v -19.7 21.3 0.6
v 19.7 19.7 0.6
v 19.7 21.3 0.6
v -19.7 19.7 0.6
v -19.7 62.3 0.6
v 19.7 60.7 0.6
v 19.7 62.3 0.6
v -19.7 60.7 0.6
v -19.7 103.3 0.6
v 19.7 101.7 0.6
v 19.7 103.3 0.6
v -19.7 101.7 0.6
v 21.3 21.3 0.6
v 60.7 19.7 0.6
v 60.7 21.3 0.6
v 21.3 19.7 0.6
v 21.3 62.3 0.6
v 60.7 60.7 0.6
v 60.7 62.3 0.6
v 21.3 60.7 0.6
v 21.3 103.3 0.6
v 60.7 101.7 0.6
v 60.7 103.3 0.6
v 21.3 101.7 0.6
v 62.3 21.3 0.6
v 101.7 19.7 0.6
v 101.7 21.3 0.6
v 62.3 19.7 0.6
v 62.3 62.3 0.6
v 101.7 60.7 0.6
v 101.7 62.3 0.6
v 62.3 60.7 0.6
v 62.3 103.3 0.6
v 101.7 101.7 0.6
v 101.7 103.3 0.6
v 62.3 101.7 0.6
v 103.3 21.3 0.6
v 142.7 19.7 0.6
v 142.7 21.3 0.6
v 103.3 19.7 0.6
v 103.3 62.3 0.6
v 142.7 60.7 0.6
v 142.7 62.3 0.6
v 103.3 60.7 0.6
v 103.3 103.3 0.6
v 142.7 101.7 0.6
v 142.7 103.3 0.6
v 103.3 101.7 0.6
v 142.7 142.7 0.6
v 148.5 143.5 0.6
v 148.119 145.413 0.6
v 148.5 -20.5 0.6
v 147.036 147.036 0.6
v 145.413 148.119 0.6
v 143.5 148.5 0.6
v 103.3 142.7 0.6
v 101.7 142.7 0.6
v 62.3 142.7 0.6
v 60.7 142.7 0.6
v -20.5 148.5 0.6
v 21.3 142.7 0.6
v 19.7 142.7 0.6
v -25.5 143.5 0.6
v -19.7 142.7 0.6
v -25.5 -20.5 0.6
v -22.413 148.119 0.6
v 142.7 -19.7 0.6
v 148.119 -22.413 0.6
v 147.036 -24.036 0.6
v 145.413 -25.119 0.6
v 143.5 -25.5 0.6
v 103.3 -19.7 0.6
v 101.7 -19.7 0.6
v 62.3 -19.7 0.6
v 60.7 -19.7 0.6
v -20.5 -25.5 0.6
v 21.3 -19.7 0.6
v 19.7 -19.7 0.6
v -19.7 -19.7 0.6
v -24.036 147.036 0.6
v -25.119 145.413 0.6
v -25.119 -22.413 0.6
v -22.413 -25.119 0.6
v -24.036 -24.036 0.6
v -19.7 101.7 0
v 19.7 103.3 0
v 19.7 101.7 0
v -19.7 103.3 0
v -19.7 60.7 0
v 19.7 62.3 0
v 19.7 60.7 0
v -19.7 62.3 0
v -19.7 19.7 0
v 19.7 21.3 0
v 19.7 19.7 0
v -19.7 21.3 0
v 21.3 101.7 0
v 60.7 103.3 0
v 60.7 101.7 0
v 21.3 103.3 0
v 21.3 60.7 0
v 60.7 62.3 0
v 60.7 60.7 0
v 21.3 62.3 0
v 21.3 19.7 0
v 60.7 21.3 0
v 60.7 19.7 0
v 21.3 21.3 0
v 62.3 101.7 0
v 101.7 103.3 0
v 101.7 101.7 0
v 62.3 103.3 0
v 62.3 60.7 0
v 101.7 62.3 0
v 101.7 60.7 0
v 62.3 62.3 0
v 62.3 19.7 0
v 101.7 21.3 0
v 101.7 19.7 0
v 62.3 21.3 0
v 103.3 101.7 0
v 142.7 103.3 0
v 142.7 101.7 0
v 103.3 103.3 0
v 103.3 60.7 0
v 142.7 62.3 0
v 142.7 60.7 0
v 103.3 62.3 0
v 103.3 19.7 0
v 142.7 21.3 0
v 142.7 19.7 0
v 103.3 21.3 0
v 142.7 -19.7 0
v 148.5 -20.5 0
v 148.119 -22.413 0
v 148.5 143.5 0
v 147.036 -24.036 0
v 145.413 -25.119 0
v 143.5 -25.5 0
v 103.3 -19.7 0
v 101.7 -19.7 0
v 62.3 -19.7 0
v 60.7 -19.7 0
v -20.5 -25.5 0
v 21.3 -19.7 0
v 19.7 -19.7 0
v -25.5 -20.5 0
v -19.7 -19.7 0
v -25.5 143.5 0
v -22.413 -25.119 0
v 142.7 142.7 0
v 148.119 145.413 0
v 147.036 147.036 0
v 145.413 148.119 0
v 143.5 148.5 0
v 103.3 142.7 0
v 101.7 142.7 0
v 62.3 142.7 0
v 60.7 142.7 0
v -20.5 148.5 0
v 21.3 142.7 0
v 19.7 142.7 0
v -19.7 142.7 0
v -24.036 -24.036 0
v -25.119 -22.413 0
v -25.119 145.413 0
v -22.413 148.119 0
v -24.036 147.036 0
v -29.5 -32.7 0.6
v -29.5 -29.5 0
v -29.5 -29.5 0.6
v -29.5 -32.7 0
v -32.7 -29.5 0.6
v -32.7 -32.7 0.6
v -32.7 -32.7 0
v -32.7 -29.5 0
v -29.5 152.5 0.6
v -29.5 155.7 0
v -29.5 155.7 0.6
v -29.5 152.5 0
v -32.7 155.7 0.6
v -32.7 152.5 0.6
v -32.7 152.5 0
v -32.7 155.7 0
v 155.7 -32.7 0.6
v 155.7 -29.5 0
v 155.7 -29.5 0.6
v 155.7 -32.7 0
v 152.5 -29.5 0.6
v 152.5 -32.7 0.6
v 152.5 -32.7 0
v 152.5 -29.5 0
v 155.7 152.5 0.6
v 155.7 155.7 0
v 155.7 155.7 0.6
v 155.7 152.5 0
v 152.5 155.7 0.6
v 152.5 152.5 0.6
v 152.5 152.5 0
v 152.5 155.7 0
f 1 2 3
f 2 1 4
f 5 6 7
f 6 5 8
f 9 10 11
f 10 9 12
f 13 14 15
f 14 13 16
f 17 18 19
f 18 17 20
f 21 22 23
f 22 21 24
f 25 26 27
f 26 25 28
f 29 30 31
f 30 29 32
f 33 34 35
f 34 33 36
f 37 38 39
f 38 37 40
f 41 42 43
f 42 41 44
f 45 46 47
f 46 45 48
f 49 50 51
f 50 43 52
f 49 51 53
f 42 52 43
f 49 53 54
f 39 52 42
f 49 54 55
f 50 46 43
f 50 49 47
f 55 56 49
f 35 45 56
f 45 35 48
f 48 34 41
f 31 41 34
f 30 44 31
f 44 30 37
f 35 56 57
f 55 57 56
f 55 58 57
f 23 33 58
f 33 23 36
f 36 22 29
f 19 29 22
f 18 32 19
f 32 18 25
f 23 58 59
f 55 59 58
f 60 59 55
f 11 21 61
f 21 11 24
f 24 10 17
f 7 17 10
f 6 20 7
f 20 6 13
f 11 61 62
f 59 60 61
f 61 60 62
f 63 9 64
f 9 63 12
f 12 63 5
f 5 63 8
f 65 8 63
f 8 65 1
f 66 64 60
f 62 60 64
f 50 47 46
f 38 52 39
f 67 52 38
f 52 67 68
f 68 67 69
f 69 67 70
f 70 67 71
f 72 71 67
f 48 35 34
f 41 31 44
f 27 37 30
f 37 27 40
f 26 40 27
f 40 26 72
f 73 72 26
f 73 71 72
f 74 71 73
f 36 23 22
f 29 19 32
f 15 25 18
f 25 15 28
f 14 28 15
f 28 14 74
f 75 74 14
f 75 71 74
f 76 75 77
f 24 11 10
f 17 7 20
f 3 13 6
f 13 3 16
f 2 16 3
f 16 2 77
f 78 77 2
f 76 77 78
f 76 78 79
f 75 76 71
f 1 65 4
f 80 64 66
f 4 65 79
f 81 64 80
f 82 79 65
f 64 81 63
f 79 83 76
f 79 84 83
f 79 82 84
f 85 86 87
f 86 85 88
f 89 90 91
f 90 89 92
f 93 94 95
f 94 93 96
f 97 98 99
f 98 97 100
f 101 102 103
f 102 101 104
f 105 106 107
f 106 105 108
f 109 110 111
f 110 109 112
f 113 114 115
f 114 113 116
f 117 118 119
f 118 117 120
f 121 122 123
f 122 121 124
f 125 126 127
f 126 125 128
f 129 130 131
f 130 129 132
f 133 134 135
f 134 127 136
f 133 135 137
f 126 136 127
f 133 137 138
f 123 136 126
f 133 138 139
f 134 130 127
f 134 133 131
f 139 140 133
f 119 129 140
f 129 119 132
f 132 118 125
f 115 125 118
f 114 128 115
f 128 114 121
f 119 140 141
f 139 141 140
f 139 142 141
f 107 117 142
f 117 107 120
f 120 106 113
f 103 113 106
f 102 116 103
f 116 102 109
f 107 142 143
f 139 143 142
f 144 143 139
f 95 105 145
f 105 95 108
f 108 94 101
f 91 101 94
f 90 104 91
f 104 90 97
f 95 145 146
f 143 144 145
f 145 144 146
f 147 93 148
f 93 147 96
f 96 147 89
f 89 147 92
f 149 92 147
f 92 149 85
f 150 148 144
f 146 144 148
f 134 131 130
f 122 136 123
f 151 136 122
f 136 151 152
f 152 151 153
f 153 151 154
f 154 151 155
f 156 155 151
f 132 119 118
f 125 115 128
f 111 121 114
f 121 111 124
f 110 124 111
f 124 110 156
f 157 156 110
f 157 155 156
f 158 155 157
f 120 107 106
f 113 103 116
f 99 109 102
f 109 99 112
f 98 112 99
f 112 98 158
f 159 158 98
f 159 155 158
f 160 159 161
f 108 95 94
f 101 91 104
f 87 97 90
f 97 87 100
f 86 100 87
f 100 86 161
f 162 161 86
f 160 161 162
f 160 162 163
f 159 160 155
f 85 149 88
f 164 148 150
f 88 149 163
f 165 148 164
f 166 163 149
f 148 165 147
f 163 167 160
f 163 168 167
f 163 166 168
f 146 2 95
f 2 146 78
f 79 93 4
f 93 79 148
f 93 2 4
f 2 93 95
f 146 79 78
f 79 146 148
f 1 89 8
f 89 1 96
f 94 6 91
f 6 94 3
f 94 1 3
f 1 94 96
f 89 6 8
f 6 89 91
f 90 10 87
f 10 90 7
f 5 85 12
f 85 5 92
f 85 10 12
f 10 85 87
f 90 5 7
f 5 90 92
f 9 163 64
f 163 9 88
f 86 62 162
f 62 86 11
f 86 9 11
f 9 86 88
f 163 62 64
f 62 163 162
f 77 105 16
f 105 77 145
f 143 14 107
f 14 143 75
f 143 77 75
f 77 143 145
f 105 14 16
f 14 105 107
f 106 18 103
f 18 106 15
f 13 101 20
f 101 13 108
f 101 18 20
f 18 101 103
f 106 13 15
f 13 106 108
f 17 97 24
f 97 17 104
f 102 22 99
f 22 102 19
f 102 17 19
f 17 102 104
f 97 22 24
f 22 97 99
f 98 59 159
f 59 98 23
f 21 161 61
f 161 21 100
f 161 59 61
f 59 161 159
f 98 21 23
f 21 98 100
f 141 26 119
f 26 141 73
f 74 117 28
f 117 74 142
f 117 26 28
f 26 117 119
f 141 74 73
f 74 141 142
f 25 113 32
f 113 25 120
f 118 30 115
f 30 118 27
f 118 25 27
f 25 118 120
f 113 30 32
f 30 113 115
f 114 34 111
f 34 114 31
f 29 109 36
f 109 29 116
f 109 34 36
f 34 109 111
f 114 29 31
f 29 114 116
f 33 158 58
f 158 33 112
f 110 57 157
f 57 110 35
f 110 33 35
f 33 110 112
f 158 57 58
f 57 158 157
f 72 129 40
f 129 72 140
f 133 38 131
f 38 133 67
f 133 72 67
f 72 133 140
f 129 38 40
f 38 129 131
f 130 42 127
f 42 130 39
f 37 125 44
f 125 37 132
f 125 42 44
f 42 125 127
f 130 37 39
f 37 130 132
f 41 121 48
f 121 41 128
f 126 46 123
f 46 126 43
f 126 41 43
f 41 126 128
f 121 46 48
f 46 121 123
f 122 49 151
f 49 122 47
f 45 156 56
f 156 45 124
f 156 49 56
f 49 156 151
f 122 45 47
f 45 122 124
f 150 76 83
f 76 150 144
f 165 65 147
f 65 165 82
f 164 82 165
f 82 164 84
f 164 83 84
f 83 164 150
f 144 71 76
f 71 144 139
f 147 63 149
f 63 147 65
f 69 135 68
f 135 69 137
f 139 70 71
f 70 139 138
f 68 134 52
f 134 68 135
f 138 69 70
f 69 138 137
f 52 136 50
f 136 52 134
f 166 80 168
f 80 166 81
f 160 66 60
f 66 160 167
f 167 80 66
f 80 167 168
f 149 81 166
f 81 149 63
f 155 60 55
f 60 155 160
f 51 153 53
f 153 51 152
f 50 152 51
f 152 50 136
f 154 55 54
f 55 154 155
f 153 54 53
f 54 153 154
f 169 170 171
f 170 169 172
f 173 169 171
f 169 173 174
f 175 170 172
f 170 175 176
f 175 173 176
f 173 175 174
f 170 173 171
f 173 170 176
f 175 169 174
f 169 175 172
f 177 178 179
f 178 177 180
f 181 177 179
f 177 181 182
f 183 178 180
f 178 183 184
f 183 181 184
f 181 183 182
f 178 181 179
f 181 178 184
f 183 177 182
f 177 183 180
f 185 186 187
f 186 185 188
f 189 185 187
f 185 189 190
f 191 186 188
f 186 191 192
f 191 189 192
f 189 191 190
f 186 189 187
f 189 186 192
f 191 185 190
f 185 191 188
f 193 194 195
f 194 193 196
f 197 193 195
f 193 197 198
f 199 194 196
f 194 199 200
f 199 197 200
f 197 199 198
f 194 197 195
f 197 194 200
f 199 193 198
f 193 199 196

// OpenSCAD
//Mark Peeters ChessBoard multi color 
// CC-BY-NC-SA Mark G. Peeters 3-17-2018
//https://www.youmagine.com/designs/chess-checkers-board-toolpath-painting
//https://www.thingiverse.com/thing:2853484
/*
I used a bit of CC0 Public Domain code to make my stars from here:
http://files.openscad.org/examples/Functions/recursion.html
 Written in 2015 by Torsten Paul <Torsten.Paul@gmx.de>
*/
/******************************************************
----------------
the idea is to print in at least 3 colors.
----------------
the registation dots are so that the slicer will place the different STL files in the exact same place on the bed.
----------------
When printing the star inside you can choose high shell count in cura and get a cool pattern.
----------------
When printing the background use low shell count like 1 and you will get basic lines
----------------
Backing will be printed in quarters on top of face parts
----------------
all face parts the same for the 4 quasters
----------------
the inner boarder is the same on all and can be trimmed off treated like a brim before assembly
----------------
Different colored stars should face in different directions, so I'm flipping them 180deg
----------------
note on code: I used a few %2. That's modulus division, which is handy for a number of things. Basically, you divide the number, and the remainder is what you have. So it's a great way to check if even or odd.
----------------

*******************************************************/

//size of squares (mm)
side=41;
//the surface thickness the board (mm) (1st layer, set in slicer)
thick=0.6;
//thickness of the whole board (mm)(including 1st layer)
thickFull=3;
//outer boarder thickness (mm)
edge_thick=5;
//inner boarder thickness, lines between squares(mm)normally 2*nozzle
lines=1.6;//nice if this is a multiple of the nozzle, 
//number of star points
start_points=5;
//star shrink (mm) so start fits inside the squares
star_shrink=0.8*4;//lines*4
//register dots spacing (mm) gap for registering dots
regspace=4;
//x num for grid (how many squares in X direction)
xnum=4;
//ynum for grid (how many squares in Y direction)
ynum=4;

//render? (1st layer) Choose which color squares to render
color2make=3;// [0:color#1 (stars no rotation), 1:color#2 (stars 180deg rotation), 3:both colors]
//render? (1st layer) Choose which inner part to render 
part2make=4;//[1:square outer, 2:square inner (stars), 4:inner boarder lines, 3:all inner parts (for visualization) , 5:no 1st layer inner objects]
//render? (1st layer) Choose which outer boarder quadrant to render
quadrant=5;//[1:Q1 outer boarder 1st layer,2:Q2 outer boarder 1st layer,3:Q3 outer boarder 1st layer,4:Q4 outer boarder 1st layer,5:all corners (1st layer), 6:no 1st layer outer boarder]
//render? (body, 2nd layer and up) Choose which quadrant for main part
quadrantMain=6;//[1:Q1 body 2nd layer and up,2:Q2 body 2nd layer and up,3:Q3 body 2nd layer and up,4:Q4 body 2nd layer and up,5:all corners body 2nd layer and up, 6:no body 2nd layer and up]


//YOU WILL NEED TO RENDER THE FOLLOWING PARTS FOR PRINTING
/*
[color2make,part2make,quadrant,quadrantMain]
visualize surface render=[3,3,5,6]
color1_outer=[0,1,6,6] //same for all quadrants
color1_inner=[0,2,6,6] //same for all quadrants
color2_outer=[1,1,6,6] //same for all quadrants
color2_inner=[1,2,6,6] //same for all quadrants
lines surface=[3,4,5,6] //same for all quadrants trim extra
body_Q1=[?,5,6,1] //1st quardant (first variable is ignored)
body_Q2=[?,5,6,2] //1st quardant (first variable is ignored)
body_Q3=[?,5,6,3] //1st quardant (first variable is ignored)
body_Q4=[?,5,6,4] //1st quardant (first variable is ignored)
*/

//////////////////////////////////////////////////////////////
////////////////make things///////////////////////////////////
//////////////////////////////////////////////////////////////
makeSquares(xnum,ynum,color2make,part2make);//(1st layer) make inner parts
make_boarder(quadrant,thick);//(1st layer) add the outer boarders
mainPart(quadrantMain);//(body, 2nd layer and up) main body part
reg_points();//(1st layer) registration points


//////////////////////////////////////////////////////////////
////////////////modules    ///////////////////////////////////
//////////////////////////////////////////////////////////////
module makeSquares(xnum,ynum,color2make,part2make){
for (x = [0:xnum-1]) {
for (y = [0:ynum-1]) {   
 //  echo(x+y,(x+y)%2,180*((x+y)%2));
    if (3==color2make){//start if for all visual
    
    if ((x+y)%2==0) {
translate([x*side,y*side,0]) rotate([0,0,180*((x+y)%2)]) 
section(side,thick,start_points,part2make); } 
else
   {
translate([x*side,y*side,0]) rotate([0,0,180*((x+y)%2)]) 
section1(side,thick,start_points,part2make); } 
}//end if for all visual
else
if ((x+y)%2==color2make) {//start if make colors
translate([x*side,y*side,0]) rotate([0,0,180*((x+y)%2)]) 
section(side,thick,start_points,part2make); }//end if make colors 
    }//end Y
}//end X
}//end modules make squares

module mainPart(quadrantMain){
//make main part 2nd layer and up
    if (quadrantMain!=6){
translate([-side/2,-side/2,thick])
cube([side*xnum,side*ynum,thickFull-thick]);}
translate([0,0,thick])
make_boarder(quadrantMain,thickFull-thick);
}//end module main part

module make_boarder(quad,z){
if ((quad==3) || (quad==5)) LB_boarder(z);
if ((quad==4) || (quad==5)) RB_boarder(z);
if ((quad==2) || (quad==5)) LT_boarder(z);
if ((quad==1) || (quad==5)) RT_boarder(z);}

//modules to make boarders/////////////
module LB_boarder(z){
 //bottom edge
translate([-side/2,-edge_thick-side/2,0])
color("black")cube([side*xnum,edge_thick,z]); 
  //left edge
translate([-edge_thick-side/2,-side/2,0])
color("black")cube([edge_thick,side*ynum,z]);
  //bottom-left corner
translate([-edge_thick-side/2,-edge_thick-side/2,0])
color("black")intersection(){
    cube([edge_thick,edge_thick,z]);
    translate([edge_thick,edge_thick,0])cylinder(r=edge_thick,h=z);}
    }//end mod LB_boarder

module RB_boarder(z){
 //bottom edge
translate([-side/2,-edge_thick-side/2,0])
color("black")cube([side*xnum,edge_thick,z]); 
  //right edge
translate([side*(xnum-0.5),-side/2,0])
color("black")cube([edge_thick,side*ynum,z]); 
   //bottom-right corner
translate([side*(xnum-0.5),-edge_thick-side/2,0])
color("black")intersection(){
    cube([edge_thick,edge_thick,z]);
    translate([0,edge_thick,0])cylinder(r=edge_thick,h=z);} 
}//end mod RB_boarder

module LT_boarder(z){
  //top edge
translate([-side/2,side*(ynum-0.5),0])
color("black")cube([side*xnum,edge_thick,z]); 
   //left edge
translate([-edge_thick-side/2,-side/2,0])
color("black")cube([edge_thick,side*ynum,z]);
   //top-left corner
translate([-edge_thick-side/2,side*(ynum-0.5),0])
color("black")intersection(){
    cube([edge_thick,edge_thick,z]);
    translate([edge_thick,0,0])cylinder(r=edge_thick,h=z);} 
}//end mod LT_boarder

module RT_boarder(z){
  //top edge
translate([-side/2,side*(ynum-0.5),0])
color("black")cube([side*xnum,edge_thick,z]); 
   //right edge
translate([side*(xnum-0.5),-side/2,0])
color("black")cube([edge_thick,side*ynum,z]);
   //top-right corner
translate([side*(xnum-0.5),side*(ynum-0.5),0])
color("black")intersection(){
    cube([edge_thick,edge_thick,z]);
    translate([0,0,0])cylinder(r=edge_thick,h=z);} 
}//end mod LB_boarder

module reg_points(){
//register points for squares/////////////////////////////////////////
//bottom-left corner
translate([-lines*2-regspace-edge_thick-side/2,-lines*2-regspace-edge_thick-side/2,0])cube([lines*2,lines*2,thick]);
//top-left register
translate([-lines*2-regspace-edge_thick-side/2,edge_thick+regspace+(ynum-0.5)*side,0])cube([lines*2,lines*2,thick]);
//bottom-right register
translate([regspace+edge_thick+(xnum-0.5)*side,-lines*2-regspace-edge_thick-side/2,0])cube([lines*2,lines*2,thick]);
//top-right register
translate([regspace+edge_thick+(xnum-0.5)*side,edge_thick+regspace+(ynum-0.5)*side,0])cube([lines*2,lines*2,thick]);

echo("print bed size needed (mm) [x,y]",regspace+edge_thick+(xnum-0.5)*side+lines*2+regspace+edge_thick+side/2,
lines*2+regspace+edge_thick+side/2+edge_thick+regspace+(ynum-0.5)*side);
}//end mod reg_points

module section(side,thick,start_points,what){
    //what=1 outer, 2 inner, 3 every thing
if (what==1){
difference(){
translate([0,0,thick/2])cube([side-lines,side-lines,thick],center=true);
translate([0,0,-1])star(start_points,side/2-star_shrink,side/4-star_shrink,thick+2);}}//end if what==1

if (what==2){
intersection(){
translate([0,0,thick/2])cube([side,side,thick],center=true);
translate([0,0,-1])star(start_points,side/2-star_shrink,side/4-star_shrink,thick+2);}}//end if what==2

if (what==3){   
color("black")translate([0,0,thick/2])cube([side,side,thick],center=true);
translate([0,0,thick/2])color("WhiteSmoke")cube([side-lines,side-lines,thick+0.2],center=true);    
color("white")translate([0,0,0])star(start_points,side/2-star_shrink,side/4-star_shrink,thick+0.4);
    }//end if what==3
    
if (what==4){
color("black")difference(){    
translate([0,0,thick/2])cube([side,side,thick],center=true);    
translate([0,0,thick/2])cube([side-lines,side-lines,thick+2],center=true);    
    }//end diff
}//end if what=4
}//end module section

//module section1 is just to get a color change when rendering all
module section1(side,thick,start_points,what){
    //what=1 outer, 2 inner, 3 every thing
if (what==1){
difference(){
translate([0,0,thick/2])cube([side-lines,side-lines,thick],center=true);
translate([0,0,-1])star(start_points,side/2-star_shrink,side/4-star_shrink,thick+2);}}//end if what==1

if (what==2){
intersection(){
translate([0,0,thick/2])cube([side,side,thick],center=true);
translate([0,0,-1])star(start_points,side/2-star_shrink,side/4-star_shrink,thick+2);}}//end if what==2

if (what==3){   
color("black")translate([0,0,thick/2])cube([side,side,thick],center=true);
translate([0,0,thick/2])color("DodgerBlue")cube([side-lines,side-lines,thick+0.2],center=true);    
color("DeepSkyBlue")translate([0,0,0])star(start_points,side/2-star_shrink,side/4-star_shrink,thick+0.4);
    }//end if what==3
    
if (what==4){
color("black")difference(){    
translate([0,0,thick/2])cube([side,side,thick],center=true);    
translate([0,0,thick/2])cube([side-lines,side-lines,thick+2],center=true);    
    }//end diff
}//end if what=4
}//end module section

module star(points, outer, inner,height) {
// With recursive functions very complex results can be generated,
// e.g. calculating the outline of a star shaped polygon. Using
// default parameters can help with simplifying the usage of functions
// that have multiple parameters.
function point(angle) = [ sin(angle), cos(angle) ];
function radius(i, r1, r2) = (i % 2) == 0 ? r1 : r2;
function starP(count, r1, r2, i = 0, result = []) = i < count
    ? starP(count, r1, r2, i + 1, concat(result, [ radius(i, r1, r2) * point(360 / count * i) ]))
    : result;


    translate([0, 0, 0])
        linear_extrude(height = height)
            polygon(starP(points*2, outer, inner));


//http://files.openscad.org/examples/Functions/recursion.html
// Written in 2015 by Torsten Paul <Torsten.Paul@gmx.de>
//
// To the extent possible under law, the author(s) have dedicated all
// copyright and related and neighboring rights to this software to the
// public domain worldwide. This software is distributed without any
// warranty.
//
// You should have received a copy of the CC0 Public Domain
// Dedication along with this software.
// If not, see <http://creativecommons.org/publicdomain/zero/1.0/>.
}//end module star
